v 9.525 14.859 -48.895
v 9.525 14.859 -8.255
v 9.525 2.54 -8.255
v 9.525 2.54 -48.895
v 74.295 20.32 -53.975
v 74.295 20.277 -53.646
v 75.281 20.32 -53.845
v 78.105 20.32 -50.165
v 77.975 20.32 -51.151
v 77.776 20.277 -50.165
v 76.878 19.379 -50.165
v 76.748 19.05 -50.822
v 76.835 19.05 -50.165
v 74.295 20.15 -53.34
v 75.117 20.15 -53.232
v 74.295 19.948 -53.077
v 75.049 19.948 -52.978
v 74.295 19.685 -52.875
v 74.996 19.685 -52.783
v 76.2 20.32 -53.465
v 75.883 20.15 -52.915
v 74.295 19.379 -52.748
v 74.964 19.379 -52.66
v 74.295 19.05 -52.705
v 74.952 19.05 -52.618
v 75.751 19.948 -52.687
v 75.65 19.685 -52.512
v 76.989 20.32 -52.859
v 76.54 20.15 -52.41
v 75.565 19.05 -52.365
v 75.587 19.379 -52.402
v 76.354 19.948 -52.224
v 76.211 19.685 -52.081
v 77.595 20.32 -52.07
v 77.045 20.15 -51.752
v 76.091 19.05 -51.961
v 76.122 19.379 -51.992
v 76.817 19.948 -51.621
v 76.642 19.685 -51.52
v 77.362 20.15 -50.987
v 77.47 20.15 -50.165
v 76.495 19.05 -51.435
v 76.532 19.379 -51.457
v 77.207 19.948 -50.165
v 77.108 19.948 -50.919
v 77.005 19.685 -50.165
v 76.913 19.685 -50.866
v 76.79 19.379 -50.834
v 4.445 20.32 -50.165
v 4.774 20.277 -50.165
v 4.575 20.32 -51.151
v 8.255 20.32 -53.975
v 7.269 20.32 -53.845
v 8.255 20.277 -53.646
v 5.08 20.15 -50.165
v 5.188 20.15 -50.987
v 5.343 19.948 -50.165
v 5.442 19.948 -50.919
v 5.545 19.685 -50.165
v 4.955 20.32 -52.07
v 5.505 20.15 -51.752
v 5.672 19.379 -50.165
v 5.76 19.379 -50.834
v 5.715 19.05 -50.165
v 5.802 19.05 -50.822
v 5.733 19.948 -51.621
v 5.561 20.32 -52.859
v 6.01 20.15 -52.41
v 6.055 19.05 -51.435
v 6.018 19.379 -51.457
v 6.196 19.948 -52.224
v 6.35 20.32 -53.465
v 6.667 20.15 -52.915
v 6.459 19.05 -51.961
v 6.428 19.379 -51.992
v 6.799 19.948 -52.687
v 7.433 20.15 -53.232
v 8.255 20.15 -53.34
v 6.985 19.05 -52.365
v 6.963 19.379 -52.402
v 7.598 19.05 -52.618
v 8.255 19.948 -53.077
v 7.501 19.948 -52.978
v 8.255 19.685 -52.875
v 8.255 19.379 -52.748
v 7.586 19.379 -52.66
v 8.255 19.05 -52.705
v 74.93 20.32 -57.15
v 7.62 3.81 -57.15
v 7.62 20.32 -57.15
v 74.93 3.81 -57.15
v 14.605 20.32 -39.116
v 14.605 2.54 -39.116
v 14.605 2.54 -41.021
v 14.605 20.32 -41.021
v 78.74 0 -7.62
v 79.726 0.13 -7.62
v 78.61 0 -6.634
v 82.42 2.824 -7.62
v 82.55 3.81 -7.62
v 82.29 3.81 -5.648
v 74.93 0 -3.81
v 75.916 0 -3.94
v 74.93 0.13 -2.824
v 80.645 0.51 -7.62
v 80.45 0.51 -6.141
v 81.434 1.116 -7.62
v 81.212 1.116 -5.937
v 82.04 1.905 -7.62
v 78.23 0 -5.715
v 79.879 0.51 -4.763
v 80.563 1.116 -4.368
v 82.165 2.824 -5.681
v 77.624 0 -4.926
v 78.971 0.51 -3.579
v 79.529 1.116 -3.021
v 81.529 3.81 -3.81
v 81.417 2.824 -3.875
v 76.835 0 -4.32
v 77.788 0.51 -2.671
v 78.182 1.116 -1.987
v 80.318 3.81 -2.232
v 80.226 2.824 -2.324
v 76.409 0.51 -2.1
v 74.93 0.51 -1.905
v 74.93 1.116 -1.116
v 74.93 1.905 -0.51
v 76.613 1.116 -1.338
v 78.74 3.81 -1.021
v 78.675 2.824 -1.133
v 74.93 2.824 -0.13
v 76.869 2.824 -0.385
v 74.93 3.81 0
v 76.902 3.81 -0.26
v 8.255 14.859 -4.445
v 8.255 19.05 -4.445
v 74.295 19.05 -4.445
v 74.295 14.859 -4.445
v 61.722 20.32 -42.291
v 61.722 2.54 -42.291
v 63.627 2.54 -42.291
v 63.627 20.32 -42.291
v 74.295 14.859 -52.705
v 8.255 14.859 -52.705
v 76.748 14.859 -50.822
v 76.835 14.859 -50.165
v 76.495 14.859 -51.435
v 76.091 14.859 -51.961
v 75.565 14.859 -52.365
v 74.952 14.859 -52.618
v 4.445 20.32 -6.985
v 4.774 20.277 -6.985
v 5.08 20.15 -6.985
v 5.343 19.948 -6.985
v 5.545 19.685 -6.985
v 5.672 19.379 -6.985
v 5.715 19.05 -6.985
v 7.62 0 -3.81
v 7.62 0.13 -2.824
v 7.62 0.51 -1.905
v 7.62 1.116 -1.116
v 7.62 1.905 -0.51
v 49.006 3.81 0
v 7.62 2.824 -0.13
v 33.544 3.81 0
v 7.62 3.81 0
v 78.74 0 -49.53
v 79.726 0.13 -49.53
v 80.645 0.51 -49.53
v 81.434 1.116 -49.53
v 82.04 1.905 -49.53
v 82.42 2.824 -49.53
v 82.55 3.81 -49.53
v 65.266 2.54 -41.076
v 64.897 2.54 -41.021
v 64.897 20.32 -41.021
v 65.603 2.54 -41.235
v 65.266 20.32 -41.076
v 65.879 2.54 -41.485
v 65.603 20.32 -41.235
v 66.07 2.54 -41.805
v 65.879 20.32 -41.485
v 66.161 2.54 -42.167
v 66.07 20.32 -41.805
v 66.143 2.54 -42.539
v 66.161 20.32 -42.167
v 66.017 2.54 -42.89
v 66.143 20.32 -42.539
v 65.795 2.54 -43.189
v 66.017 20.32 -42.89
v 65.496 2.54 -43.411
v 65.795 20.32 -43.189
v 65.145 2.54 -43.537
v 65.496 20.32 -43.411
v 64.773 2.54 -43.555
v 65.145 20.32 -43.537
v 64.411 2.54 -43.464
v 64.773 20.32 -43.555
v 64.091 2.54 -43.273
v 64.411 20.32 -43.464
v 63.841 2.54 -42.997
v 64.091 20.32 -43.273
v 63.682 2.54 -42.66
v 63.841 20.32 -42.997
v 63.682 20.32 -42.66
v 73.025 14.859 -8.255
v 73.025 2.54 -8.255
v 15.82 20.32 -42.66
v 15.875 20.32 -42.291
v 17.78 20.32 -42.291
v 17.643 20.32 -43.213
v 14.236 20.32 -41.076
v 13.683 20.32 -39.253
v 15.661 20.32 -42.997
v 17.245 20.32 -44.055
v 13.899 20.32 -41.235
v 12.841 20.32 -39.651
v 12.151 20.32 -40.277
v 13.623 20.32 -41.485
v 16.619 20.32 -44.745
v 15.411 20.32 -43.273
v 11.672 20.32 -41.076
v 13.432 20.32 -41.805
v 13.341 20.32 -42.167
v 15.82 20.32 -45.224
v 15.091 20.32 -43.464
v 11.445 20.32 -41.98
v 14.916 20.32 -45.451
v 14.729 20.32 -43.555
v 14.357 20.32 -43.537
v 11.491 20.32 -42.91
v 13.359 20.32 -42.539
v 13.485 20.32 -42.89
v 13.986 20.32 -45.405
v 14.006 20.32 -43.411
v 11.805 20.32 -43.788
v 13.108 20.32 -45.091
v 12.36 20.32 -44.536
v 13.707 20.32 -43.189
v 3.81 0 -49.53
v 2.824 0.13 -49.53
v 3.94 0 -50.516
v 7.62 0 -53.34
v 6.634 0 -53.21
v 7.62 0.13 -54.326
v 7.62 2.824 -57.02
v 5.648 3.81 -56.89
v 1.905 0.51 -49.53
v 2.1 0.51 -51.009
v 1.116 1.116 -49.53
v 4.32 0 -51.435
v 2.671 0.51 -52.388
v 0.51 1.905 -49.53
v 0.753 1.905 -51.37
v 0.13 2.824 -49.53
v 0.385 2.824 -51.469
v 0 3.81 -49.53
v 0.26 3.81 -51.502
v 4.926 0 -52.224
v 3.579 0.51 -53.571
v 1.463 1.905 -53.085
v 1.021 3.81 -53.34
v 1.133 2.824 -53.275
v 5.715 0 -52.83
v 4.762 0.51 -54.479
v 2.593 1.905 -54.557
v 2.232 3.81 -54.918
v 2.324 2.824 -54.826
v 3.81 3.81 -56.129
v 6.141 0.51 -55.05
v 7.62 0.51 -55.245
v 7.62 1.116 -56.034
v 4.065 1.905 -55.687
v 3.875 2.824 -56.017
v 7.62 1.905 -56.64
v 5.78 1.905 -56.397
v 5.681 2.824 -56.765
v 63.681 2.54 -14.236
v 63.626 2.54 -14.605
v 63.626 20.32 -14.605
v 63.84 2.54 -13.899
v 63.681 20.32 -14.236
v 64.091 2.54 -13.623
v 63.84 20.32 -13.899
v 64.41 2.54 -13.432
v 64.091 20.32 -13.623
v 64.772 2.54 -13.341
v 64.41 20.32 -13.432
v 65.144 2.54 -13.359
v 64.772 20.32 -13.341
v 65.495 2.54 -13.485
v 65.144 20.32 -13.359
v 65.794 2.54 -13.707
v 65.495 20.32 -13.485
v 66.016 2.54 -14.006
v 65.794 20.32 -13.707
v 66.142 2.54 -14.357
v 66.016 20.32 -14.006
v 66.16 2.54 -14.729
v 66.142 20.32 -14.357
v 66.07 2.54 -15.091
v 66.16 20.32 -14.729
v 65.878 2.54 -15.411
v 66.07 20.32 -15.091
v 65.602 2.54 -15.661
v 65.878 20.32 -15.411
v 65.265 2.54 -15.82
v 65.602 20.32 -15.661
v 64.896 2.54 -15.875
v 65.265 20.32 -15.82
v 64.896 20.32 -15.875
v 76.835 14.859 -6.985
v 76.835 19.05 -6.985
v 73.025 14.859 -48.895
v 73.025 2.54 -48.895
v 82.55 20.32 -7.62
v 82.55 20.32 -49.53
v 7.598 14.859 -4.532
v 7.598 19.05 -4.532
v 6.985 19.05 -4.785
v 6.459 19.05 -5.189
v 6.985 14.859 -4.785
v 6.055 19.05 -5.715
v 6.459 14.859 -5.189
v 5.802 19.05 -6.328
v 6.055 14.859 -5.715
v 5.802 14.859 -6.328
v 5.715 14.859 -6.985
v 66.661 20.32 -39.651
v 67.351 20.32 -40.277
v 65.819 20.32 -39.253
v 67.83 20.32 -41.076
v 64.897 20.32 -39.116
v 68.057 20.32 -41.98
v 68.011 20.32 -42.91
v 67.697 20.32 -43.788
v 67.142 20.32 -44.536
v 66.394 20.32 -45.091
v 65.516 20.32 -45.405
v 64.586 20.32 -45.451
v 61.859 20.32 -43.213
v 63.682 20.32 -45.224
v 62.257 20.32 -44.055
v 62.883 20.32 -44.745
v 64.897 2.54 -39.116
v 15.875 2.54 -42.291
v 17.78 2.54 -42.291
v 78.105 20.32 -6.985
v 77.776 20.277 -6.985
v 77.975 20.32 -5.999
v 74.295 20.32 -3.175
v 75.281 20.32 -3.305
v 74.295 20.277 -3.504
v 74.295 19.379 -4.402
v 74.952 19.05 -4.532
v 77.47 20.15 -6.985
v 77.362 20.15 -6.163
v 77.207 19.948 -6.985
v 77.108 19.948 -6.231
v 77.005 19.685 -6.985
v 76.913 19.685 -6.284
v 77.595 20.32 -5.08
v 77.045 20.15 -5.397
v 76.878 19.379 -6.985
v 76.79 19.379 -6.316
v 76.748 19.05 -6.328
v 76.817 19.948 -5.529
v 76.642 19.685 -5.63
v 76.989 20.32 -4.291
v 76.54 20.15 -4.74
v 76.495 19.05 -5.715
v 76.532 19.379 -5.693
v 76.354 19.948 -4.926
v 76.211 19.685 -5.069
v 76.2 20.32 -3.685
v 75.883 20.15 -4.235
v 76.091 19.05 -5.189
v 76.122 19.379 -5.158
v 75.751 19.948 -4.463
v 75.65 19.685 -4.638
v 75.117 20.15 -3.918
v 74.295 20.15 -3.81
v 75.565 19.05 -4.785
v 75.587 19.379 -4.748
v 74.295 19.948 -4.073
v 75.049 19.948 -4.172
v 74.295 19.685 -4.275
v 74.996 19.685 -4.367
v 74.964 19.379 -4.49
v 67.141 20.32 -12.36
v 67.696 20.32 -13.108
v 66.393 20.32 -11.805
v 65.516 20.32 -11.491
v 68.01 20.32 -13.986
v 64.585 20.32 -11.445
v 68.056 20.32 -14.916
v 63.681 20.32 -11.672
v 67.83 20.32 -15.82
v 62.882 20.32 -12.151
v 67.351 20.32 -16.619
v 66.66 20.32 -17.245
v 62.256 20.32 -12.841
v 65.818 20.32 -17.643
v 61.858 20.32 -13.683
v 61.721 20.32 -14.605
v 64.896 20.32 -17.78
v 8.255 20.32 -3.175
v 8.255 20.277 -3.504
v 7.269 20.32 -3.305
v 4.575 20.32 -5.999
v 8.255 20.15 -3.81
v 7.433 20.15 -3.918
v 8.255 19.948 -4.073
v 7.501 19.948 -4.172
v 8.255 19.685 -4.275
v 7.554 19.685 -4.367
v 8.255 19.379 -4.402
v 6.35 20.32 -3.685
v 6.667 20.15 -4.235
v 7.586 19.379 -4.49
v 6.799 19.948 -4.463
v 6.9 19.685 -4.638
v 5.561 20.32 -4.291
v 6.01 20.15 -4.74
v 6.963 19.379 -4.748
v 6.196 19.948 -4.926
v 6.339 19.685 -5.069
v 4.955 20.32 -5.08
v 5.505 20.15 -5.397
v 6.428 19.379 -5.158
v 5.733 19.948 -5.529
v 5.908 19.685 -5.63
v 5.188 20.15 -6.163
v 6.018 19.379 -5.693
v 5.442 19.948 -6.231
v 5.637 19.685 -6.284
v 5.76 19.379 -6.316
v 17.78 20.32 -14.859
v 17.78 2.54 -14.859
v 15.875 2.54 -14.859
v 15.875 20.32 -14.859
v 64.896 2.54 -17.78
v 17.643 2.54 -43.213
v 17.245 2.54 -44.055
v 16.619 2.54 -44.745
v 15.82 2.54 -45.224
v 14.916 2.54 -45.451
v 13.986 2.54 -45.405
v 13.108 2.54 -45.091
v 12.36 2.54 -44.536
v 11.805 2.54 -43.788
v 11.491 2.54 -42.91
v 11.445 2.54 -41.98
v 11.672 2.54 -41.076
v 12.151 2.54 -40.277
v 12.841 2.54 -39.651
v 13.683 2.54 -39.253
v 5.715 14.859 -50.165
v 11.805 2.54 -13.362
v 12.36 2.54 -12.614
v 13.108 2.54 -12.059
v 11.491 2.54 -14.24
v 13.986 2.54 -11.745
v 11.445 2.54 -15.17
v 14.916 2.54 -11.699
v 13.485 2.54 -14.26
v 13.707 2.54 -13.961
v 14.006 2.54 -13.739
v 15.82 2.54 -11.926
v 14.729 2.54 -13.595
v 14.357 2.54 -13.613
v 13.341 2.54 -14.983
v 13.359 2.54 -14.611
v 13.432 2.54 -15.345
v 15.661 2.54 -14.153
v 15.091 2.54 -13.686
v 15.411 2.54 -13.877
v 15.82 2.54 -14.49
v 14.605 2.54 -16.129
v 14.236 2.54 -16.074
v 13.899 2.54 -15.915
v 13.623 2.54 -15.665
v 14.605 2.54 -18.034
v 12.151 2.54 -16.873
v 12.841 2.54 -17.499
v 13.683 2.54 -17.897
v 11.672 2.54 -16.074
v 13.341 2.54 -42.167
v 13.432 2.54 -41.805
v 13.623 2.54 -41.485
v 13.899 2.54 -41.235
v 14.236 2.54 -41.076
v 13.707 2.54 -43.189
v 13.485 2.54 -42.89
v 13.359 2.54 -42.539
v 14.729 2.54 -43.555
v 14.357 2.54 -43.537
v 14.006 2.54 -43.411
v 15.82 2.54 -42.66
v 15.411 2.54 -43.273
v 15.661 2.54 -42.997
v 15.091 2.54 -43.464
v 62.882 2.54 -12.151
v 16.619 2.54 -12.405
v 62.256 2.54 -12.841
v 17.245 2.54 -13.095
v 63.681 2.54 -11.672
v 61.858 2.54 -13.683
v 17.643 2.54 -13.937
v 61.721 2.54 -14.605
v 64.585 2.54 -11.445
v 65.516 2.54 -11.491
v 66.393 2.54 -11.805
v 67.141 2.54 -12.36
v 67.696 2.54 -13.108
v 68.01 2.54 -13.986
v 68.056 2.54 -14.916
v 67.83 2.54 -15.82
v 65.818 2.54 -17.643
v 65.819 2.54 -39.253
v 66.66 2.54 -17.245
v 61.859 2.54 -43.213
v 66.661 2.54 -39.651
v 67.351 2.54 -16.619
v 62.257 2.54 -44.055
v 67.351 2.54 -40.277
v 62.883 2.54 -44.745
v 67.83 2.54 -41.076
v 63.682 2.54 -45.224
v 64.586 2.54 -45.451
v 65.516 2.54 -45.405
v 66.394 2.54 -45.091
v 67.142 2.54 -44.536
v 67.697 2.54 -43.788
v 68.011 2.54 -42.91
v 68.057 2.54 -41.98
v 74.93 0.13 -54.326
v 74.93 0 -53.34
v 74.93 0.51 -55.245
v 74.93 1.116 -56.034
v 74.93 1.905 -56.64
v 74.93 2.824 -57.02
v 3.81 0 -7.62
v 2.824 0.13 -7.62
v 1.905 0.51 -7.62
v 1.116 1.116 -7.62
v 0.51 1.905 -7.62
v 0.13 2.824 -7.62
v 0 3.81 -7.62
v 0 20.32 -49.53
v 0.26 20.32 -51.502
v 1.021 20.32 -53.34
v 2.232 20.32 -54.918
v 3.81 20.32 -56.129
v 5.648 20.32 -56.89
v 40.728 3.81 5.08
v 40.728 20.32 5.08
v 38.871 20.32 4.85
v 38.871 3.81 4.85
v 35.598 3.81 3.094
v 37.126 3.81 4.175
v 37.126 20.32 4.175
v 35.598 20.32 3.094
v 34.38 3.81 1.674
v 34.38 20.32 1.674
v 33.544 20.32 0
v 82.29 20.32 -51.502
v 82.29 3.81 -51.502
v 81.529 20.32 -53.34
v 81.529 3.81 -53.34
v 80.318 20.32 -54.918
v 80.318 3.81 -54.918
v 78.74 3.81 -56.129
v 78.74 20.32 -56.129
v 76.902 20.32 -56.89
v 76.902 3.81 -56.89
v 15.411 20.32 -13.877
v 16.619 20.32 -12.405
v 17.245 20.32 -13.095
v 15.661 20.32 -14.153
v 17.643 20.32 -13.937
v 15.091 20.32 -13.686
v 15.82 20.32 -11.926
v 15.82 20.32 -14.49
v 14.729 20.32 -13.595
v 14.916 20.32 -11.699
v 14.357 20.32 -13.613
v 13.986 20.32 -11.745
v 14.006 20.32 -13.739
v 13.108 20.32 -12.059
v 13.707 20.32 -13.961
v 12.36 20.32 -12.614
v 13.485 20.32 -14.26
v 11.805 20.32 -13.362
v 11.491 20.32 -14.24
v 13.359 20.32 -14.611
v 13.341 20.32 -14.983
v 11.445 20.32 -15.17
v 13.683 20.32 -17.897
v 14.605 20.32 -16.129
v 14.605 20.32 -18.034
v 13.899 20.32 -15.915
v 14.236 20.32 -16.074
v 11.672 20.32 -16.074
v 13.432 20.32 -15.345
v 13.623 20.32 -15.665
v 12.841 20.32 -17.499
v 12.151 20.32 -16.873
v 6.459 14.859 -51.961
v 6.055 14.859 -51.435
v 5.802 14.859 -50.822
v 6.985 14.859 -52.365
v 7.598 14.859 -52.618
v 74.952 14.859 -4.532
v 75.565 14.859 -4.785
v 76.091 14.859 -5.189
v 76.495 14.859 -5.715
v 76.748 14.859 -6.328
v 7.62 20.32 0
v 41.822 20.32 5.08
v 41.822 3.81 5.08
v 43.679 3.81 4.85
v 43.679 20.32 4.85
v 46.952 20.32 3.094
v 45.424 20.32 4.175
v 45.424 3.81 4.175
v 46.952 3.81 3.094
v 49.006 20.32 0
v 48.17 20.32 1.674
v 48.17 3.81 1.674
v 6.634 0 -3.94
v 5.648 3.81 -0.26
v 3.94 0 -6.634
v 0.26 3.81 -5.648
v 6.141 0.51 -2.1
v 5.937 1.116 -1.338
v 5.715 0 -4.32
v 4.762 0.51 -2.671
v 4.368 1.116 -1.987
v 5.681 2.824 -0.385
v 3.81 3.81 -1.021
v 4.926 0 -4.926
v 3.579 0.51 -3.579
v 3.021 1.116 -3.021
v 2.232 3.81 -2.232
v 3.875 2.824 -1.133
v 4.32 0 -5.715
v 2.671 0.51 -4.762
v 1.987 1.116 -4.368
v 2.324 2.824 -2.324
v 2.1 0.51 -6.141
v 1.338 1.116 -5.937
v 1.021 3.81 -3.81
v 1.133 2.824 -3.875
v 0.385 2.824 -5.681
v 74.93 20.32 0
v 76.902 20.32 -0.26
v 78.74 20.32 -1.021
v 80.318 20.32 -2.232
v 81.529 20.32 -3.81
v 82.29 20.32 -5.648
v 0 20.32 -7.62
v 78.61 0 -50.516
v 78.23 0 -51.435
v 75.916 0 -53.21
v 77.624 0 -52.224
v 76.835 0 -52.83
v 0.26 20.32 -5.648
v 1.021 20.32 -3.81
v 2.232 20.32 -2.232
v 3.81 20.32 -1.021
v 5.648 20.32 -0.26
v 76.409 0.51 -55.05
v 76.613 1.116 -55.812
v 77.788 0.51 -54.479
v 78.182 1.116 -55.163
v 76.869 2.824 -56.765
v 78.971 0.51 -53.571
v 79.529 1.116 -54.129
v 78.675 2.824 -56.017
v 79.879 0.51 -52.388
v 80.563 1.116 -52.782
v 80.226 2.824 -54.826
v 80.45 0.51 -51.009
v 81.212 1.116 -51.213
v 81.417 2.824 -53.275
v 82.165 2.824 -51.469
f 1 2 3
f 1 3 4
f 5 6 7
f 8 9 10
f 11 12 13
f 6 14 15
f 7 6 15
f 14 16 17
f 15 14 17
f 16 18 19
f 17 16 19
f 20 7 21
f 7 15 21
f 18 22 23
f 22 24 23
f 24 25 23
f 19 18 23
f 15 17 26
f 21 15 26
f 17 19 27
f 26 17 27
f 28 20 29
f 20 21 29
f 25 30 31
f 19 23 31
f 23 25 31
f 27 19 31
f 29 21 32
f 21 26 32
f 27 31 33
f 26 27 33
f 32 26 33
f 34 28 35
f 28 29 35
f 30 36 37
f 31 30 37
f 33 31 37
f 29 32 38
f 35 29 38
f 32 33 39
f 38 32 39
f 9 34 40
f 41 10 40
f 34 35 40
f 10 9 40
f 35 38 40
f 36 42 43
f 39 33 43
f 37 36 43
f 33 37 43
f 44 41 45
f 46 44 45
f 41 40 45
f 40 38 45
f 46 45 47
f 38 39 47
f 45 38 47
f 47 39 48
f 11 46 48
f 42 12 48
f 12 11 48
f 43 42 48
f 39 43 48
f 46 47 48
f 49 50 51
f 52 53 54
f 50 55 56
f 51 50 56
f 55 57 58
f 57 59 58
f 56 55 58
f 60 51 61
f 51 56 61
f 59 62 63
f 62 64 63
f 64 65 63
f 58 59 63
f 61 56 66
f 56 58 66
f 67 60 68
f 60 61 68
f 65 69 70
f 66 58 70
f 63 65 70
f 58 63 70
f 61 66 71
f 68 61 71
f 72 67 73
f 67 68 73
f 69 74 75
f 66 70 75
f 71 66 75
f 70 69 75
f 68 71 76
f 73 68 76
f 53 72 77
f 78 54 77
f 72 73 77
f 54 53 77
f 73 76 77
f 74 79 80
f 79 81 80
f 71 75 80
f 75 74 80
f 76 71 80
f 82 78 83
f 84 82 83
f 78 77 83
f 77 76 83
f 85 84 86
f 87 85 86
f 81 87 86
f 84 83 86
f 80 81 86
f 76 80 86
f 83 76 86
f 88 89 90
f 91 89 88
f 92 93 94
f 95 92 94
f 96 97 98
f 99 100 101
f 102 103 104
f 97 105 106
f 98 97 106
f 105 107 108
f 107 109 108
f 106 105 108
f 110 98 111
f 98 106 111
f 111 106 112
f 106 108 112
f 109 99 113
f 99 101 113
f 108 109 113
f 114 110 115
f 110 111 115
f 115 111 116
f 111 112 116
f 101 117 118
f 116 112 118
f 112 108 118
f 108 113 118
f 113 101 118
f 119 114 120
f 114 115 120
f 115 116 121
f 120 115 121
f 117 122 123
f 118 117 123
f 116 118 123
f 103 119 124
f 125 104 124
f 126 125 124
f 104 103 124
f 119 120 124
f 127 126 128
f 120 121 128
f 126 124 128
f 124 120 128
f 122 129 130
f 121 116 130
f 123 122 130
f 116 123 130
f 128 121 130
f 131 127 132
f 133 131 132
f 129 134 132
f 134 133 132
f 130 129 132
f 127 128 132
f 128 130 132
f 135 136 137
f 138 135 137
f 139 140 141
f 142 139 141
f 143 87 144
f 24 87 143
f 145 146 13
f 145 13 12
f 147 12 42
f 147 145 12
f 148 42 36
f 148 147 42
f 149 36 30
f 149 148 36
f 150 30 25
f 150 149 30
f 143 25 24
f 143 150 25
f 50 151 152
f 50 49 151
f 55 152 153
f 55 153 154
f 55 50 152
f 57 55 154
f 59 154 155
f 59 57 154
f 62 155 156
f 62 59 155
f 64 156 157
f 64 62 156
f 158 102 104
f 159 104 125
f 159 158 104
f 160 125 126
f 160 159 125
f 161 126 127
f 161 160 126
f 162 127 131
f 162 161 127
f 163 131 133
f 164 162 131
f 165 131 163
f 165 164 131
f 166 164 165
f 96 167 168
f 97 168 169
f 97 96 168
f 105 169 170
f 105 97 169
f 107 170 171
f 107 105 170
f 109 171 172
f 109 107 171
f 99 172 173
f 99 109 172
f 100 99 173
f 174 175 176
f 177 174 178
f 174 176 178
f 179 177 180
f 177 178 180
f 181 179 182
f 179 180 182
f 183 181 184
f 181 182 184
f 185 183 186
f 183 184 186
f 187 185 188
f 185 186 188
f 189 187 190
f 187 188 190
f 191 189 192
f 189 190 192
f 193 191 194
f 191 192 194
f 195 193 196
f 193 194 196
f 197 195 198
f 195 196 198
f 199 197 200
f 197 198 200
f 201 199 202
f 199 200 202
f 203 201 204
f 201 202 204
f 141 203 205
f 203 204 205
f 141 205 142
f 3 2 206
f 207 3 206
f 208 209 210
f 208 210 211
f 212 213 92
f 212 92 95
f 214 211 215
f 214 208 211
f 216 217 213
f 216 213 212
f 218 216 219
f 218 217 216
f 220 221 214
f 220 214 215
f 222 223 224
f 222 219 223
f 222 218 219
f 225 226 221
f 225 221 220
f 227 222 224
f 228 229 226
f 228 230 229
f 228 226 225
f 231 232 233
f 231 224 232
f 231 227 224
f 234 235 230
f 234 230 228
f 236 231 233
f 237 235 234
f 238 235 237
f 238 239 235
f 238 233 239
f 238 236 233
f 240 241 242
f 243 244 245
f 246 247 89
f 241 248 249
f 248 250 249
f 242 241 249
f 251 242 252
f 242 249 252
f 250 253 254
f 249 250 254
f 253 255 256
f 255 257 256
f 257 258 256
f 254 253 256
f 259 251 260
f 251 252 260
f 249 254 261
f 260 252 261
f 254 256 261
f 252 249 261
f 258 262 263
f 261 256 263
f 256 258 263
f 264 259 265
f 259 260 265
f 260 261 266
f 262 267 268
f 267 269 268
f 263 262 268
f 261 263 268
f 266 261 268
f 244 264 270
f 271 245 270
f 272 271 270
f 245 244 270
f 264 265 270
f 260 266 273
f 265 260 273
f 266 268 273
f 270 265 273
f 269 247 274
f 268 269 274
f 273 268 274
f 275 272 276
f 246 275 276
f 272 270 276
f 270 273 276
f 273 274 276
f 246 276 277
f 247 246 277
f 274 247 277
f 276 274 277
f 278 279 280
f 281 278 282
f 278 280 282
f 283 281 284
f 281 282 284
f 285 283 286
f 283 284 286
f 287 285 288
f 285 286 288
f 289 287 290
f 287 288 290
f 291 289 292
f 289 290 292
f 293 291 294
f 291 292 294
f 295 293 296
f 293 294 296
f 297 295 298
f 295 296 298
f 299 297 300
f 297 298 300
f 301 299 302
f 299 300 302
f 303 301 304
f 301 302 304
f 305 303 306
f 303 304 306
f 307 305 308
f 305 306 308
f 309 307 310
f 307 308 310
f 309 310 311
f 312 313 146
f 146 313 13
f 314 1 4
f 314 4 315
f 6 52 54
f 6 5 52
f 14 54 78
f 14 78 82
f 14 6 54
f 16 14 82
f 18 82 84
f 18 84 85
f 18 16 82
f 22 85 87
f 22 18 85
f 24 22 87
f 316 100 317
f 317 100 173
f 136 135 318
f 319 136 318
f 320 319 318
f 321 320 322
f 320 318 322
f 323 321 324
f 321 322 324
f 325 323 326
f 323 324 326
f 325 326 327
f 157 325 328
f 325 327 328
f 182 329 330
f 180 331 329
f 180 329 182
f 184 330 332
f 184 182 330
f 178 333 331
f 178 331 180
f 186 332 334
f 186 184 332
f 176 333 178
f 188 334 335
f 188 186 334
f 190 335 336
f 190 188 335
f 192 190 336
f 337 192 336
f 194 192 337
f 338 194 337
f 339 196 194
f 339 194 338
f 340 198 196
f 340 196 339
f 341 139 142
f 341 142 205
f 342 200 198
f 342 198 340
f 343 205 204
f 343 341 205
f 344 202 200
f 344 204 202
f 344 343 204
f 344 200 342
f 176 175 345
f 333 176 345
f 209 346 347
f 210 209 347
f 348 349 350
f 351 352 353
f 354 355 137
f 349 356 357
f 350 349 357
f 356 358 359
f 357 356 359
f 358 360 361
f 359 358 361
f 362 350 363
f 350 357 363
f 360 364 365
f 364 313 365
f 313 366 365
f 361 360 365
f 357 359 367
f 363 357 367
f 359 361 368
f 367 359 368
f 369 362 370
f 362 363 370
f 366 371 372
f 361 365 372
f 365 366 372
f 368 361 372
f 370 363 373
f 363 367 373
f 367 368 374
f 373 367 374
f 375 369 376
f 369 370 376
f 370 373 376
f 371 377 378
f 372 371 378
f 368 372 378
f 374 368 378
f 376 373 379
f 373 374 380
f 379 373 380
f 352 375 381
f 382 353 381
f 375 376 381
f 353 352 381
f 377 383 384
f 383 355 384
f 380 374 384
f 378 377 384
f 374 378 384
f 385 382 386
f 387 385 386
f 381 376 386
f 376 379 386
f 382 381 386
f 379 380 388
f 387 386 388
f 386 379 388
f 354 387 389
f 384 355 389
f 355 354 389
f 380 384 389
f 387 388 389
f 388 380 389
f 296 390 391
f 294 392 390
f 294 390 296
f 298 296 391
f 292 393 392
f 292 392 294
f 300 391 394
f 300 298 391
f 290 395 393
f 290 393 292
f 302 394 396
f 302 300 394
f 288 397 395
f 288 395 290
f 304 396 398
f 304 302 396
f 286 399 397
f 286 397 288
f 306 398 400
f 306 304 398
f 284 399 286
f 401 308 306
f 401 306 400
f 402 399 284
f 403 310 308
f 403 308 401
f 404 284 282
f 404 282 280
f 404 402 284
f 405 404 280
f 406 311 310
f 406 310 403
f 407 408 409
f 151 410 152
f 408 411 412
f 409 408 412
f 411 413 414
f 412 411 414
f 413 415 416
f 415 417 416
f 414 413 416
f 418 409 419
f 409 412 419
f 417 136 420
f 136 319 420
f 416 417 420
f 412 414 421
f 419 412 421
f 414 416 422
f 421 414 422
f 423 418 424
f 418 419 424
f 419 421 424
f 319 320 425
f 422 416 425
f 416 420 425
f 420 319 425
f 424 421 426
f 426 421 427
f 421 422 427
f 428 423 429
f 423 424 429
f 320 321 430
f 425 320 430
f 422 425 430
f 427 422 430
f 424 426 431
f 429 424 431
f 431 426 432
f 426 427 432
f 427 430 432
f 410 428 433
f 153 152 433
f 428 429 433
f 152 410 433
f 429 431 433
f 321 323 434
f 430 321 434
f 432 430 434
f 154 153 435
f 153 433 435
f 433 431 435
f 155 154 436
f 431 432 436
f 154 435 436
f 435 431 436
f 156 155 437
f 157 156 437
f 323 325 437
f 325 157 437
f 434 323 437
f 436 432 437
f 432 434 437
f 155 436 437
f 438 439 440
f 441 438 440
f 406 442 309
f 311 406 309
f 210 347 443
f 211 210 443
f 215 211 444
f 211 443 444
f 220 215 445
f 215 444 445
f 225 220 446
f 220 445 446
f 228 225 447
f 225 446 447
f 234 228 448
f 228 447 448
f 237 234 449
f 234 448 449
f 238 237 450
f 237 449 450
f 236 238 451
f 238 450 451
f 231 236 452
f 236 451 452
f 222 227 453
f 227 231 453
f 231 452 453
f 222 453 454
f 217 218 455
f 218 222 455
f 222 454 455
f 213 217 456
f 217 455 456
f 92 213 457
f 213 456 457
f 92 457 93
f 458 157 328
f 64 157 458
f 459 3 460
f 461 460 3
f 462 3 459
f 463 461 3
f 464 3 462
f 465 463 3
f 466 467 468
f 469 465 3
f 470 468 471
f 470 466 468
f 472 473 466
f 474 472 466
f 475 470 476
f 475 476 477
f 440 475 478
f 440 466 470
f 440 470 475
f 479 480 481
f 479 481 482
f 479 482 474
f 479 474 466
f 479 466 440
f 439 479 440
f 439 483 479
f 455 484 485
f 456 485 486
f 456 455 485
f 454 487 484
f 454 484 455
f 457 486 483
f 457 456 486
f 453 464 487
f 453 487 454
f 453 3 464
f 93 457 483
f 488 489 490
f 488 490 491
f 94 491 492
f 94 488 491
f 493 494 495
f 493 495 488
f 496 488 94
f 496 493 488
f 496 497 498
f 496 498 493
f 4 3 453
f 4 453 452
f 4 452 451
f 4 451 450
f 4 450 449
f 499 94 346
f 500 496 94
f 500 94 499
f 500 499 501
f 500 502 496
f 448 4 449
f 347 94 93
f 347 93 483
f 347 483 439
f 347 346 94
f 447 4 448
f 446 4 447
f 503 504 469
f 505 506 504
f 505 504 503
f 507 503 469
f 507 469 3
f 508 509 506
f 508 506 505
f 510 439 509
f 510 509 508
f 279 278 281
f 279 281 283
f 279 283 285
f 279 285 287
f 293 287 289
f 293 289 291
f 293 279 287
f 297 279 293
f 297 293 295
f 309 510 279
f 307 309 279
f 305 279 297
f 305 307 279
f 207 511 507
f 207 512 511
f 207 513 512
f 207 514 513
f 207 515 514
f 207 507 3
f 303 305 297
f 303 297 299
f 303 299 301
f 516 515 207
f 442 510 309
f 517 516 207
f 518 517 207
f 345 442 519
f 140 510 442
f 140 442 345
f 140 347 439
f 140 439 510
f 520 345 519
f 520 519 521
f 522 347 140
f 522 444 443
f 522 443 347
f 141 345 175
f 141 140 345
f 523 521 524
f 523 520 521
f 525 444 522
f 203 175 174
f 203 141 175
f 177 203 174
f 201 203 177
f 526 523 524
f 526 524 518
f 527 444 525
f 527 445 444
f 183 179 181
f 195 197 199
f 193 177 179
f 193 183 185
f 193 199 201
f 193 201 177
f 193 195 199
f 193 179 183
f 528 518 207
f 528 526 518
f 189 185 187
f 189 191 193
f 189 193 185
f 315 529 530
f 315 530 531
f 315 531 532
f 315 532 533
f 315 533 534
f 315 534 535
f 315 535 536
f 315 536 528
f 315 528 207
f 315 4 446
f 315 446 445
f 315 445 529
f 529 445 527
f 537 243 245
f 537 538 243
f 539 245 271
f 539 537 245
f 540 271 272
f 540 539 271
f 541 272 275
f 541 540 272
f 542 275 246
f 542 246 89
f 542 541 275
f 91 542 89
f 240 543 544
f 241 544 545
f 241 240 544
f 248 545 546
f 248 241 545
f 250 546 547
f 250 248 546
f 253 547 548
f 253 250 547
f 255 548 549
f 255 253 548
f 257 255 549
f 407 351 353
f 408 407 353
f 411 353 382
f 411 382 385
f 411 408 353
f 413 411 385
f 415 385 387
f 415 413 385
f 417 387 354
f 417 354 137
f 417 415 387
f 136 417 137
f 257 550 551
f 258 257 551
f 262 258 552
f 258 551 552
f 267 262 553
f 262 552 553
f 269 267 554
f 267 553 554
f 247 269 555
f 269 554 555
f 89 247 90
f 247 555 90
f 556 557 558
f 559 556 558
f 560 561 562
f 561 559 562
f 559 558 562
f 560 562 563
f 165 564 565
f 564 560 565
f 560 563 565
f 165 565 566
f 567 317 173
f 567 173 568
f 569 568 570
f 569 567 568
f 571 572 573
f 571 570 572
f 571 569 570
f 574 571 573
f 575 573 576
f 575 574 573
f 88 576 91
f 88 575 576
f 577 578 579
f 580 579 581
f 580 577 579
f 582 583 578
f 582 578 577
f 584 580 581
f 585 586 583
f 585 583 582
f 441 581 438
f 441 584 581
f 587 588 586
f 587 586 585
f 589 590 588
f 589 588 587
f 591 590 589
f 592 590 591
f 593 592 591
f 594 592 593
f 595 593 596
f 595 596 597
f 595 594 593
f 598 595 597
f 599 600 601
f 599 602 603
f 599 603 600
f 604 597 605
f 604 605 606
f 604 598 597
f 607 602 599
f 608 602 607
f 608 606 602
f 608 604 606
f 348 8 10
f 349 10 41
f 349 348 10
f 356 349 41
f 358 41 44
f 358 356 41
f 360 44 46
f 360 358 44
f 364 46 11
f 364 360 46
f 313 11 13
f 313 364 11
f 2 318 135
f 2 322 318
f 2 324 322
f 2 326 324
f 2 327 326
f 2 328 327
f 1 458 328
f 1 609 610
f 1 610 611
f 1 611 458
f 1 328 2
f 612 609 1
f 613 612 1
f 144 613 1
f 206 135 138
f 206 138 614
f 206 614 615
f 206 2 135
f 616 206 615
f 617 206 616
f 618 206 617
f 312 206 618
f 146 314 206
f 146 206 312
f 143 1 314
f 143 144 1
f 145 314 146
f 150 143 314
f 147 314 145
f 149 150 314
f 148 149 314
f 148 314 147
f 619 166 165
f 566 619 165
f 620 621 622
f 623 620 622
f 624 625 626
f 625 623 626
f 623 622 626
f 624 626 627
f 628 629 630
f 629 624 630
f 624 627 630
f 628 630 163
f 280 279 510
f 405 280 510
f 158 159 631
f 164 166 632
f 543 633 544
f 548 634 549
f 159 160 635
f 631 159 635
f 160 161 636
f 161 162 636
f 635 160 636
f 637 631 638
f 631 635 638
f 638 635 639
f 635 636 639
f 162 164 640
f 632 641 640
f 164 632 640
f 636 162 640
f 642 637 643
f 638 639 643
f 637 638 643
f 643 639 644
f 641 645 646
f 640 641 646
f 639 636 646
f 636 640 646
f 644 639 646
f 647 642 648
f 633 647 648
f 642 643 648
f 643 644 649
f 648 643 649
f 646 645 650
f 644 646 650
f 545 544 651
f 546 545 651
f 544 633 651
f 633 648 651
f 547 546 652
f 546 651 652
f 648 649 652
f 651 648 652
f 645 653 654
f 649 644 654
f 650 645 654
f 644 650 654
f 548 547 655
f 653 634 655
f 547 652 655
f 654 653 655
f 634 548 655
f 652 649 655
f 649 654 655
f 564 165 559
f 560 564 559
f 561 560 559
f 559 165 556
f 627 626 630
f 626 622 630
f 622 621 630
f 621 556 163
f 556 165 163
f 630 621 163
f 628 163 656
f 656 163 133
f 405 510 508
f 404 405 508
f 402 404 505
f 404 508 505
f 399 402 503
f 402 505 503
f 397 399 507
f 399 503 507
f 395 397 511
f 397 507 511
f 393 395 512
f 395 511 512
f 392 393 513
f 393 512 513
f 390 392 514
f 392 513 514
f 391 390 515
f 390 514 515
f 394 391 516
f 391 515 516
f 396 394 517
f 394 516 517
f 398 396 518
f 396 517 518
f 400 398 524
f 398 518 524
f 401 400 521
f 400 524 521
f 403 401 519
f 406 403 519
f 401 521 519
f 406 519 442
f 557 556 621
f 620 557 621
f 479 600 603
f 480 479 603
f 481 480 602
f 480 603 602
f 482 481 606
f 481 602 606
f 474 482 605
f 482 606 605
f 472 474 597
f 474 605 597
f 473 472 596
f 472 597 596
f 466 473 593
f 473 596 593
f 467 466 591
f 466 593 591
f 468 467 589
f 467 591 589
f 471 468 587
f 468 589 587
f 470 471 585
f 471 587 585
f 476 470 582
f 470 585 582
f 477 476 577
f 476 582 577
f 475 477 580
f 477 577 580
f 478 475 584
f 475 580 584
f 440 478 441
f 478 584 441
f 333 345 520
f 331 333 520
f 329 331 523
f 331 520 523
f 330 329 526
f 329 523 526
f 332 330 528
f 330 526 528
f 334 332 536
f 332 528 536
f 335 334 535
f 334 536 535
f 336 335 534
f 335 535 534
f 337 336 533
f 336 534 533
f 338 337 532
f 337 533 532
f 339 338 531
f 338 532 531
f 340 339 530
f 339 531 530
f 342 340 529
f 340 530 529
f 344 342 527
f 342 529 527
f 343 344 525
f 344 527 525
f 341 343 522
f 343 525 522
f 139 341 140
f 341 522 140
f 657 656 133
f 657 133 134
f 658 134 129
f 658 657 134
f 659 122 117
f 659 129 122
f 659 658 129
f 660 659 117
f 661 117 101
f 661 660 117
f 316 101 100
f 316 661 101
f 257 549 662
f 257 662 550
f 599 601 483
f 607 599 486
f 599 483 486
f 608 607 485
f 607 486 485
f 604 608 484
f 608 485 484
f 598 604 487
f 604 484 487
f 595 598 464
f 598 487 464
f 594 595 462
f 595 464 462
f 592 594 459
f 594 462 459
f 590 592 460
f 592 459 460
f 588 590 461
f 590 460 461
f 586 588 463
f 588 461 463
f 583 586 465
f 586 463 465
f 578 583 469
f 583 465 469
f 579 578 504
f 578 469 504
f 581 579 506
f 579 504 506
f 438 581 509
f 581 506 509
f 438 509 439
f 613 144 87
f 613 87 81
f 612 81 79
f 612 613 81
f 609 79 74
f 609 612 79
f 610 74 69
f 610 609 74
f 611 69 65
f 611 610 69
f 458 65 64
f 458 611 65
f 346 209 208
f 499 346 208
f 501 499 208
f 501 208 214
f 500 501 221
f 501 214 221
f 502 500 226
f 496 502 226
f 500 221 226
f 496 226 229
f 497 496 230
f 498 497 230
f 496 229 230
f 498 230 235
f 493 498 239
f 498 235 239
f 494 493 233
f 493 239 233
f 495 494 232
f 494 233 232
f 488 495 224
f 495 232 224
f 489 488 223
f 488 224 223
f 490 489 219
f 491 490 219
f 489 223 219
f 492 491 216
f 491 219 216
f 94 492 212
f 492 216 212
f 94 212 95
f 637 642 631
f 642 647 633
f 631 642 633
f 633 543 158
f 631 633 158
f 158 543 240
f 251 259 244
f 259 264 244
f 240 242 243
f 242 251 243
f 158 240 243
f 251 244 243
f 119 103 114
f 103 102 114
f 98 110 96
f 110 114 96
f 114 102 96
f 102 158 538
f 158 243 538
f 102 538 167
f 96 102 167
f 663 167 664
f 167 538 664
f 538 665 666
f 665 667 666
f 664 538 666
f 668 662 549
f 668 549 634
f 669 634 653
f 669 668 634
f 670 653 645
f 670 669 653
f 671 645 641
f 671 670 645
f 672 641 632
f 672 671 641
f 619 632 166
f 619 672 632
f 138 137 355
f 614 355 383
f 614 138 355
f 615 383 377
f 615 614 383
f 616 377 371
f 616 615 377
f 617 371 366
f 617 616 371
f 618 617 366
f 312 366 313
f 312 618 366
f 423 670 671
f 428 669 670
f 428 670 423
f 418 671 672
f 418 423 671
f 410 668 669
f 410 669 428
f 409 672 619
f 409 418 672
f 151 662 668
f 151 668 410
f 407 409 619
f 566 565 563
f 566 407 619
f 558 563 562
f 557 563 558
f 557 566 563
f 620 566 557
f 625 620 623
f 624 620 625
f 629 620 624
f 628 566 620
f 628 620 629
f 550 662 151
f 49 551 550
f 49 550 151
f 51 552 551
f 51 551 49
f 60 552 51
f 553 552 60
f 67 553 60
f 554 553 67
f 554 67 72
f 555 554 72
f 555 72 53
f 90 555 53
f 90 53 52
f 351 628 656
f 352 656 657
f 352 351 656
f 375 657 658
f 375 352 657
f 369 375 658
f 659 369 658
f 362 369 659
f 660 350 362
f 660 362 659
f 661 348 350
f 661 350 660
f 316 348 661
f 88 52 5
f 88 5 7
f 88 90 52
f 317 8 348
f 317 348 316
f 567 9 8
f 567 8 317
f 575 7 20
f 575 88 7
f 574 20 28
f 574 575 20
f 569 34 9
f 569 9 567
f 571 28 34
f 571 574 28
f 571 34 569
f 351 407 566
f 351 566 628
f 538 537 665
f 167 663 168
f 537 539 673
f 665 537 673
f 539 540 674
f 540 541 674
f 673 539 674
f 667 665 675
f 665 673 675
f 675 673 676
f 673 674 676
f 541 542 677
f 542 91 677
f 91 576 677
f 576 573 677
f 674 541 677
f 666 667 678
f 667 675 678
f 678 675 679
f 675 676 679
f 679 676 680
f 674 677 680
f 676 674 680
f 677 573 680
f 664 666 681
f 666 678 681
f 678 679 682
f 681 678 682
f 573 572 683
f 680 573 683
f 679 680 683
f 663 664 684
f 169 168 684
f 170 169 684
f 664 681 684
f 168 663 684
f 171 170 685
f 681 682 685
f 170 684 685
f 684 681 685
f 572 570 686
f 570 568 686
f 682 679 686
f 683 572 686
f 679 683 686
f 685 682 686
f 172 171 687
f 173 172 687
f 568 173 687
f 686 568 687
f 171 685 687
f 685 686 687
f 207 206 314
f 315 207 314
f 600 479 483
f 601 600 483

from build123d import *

# Parameters (mm, degrees)
SKETCH1_W               = 82.55
SKETCH1_H               = 57.15
BOSS_EXTRUDE1_DEPTH     = 20.32
FILLET2_R               = 7.62
FILLET3_R               = 3.81
SKETCH2_W               = 63.5
SKETCH2_H               = 40.64
CUT_EXTRUDE1_DEPTH      = 17.78
SKETCH9_W               = 15.46152766
SKETCH9_H               = 16.51
BOSS_EXTRUDE5_DEPTH     = 5.08
FILLET10_R              = 7.62
SKETCH7_W               = 71.12
SKETCH7_H               = 48.26
CUT_EXTRUDE4_DEPTH      = 5.461
FILLET12_R              = 2.54
FILLET13_R              = 1.27
SKETCH5_R               = 3.175
BOSS_EXTRUDE6_DEPTH     = 17.78
SKETCH11_R              = 1.27
CUT_EXTRUDE5_DEPTH      = 17.78
CUT_EXTRUDE_THIN1_DEPTH = 102.964471319


with BuildPart() as part:
    # Sketch1 → Boss-Extrude1 (new body)
    with BuildSketch(Plane(origin=(0, 0, 0), x_dir=(1, 0, 0), z_dir=(0, 1, 0))):
        with Locations((41.275, 28.575)):
            Rectangle(SKETCH1_W, SKETCH1_H)
    extrude(amount=BOSS_EXTRUDE1_DEPTH)

    # Fillet2
    fillet2_edges = [part.edges().sort_by_distance(p)[0] for p in [
        (0, 10.16, -57.15),
        (82.55, 10.16, -57.15),
        (82.55, 10.16, 0),
        (0, 10.16, 0),
    ]]
    fillet(fillet2_edges, radius=FILLET2_R)

    # Fillet3
    fillet3_edges = [part.edges().sort_by_distance(p)[0] for p in [
        (41.275, 0, -57.15),
        (0, 0, -28.575),
        (82.55, 0, -28.575),
        (41.275, 0, 0),
        (2.231846327, 0, -54.918153673),
        (2.231846327, 0, -2.231846327),
        (80.318153673, 0, -2.231846327),
        (80.318153673, 0, -54.918153673),
    ]]
    fillet(fillet3_edges, radius=FILLET3_R)

    # Sketch2 → Cut-Extrude1 (cut)
    with BuildSketch(Plane(origin=(0, 20.32, 0), x_dir=(1, 0, 0), z_dir=(0, 1, 0))):
        with Locations((41.275, 28.575)):
            Rectangle(SKETCH2_W, SKETCH2_H)
    extrude(amount=-CUT_EXTRUDE1_DEPTH, mode=Mode.SUBTRACT)

    # Sketch9 → Boss-Extrude5 (add)
    with BuildSketch(Plane.XY):
        with Locations((41.275, 12.065)):
            Rectangle(SKETCH9_W, SKETCH9_H)
    extrude(amount=BOSS_EXTRUDE5_DEPTH)

    # Fillet10
    # the kernel refuses this fillet: 7.62 mm, written as the material it takes off along each edge
    with BuildSketch(Plane(origin=(49.00576383, -14.150512242, 5.08), x_dir=(-1, 0, 0), z_dir=(0, 1, 0))) as fillet10_piece_1:
        with BuildLine():
            CenterArc((7.184204897, -7.62), FILLET10_R, 90, 70.528779366)
            Line((0, -5.08), (-0.143684098, -5.0292))
            ThreePointArc((-0.143684098, -5.0292), (-0.1524, -2.54), (-0.1524, 0))
            Line((-0.1524, 0), (0, 0.1524))
            Line((0, 0.1524), (7.184204897, 0.1524))
            Line((7.184204897, 0.1524), (7.184204897, 0))
        make_face()
    extrude(amount=52.431024484, mode=Mode.SUBTRACT)
    with BuildSketch(Plane(origin=(33.54423617, 38.280512242, 5.08), x_dir=(0, 0, -1), z_dir=(0, -1, 0))) as fillet10_piece_2:
        with BuildLine():
            CenterArc((7.62, 7.184204897), FILLET10_R, 180, 70.528779366)
            Line((0, 7.184204897), (-0.1524, 7.184204897))
            Line((-0.1524, 7.184204897), (-0.1524, 0))
            Line((-0.1524, 0), (0, -0.1524))
            ThreePointArc((0, -0.1524), (2.54, -0.1524), (5.0292, -0.143684098))
            Line((5.0292, -0.143684098), (5.08, 0))
        make_face()
    extrude(amount=52.431024484, mode=Mode.SUBTRACT)

    # Sketch7 → Cut-Extrude4 (cut)
    with BuildSketch(Plane(origin=(0, 20.32, 0), x_dir=(1, 0, 0), z_dir=(0, 1, 0))):
        with Locations((41.275, 28.575)):
            Rectangle(SKETCH7_W, SKETCH7_H)
    extrude(amount=-CUT_EXTRUDE4_DEPTH, mode=Mode.SUBTRACT)

    # Fillet12
    fillet12_edges = [part.edges().sort_by_distance(p)[0] for p in [
        (5.715, 17.5895, -52.705),
        (76.835, 17.5895, -52.705),
        (76.835, 17.5895, -4.445),
        (5.715, 17.5895, -4.445),
    ]]
    fillet(fillet12_edges, radius=FILLET12_R)

    # Fillet13
    fillet13_edges = [part.edges().sort_by_distance(p)[0] for p in [
        (41.275, 20.32, -52.705),
        (76.835, 20.32, -28.575),
        (41.275, 20.32, -4.445),
        (5.715, 20.32, -28.575),
        (76.091051224, 20.32, -51.961051224),
        (76.091051224, 20.32, -5.188948776),
        (6.458948776, 20.32, -51.961051224),
        (6.458948776, 20.32, -5.188948776),
    ]]
    fillet(fillet13_edges, radius=FILLET13_R)

    # Sketch5 → Boss-Extrude6 (add)
    with BuildSketch(Plane(origin=(0, 2.54, 0), x_dir=(1, 0, 0), z_dir=(0, 1, 0))):
        with Locations(Location((14.605, 42.291, 0), (0, 0, 90))):
            Circle(SKETCH5_R)
        with Locations(Location((14.605, 14.859, 0), (0, 0, 90))):
            Circle(SKETCH5_R)
        with Locations(Location((64.897, 42.291, 0), (0, 0, 90))):
            Circle(SKETCH5_R)
        with Locations(Location((64.896358582, 14.605, 0), (0, 0, 90))):
            Circle(SKETCH5_R)
    extrude(amount=BOSS_EXTRUDE6_DEPTH)

    # Sketch11 → Cut-Extrude5 (cut)
    with BuildSketch(Plane(origin=(0, 20.32, 0), x_dir=(1, 0, 0), z_dir=(0, 1, 0))):
        with Locations(Location((14.605, 14.859, 0), (0, 0, 270))):
            Circle(SKETCH11_R)
        with Locations(Location((14.605, 42.291, 0), (0, 0, 270))):
            Circle(SKETCH11_R)
        with Locations(Location((64.896358582, 14.605, 0), (0, 0, 270))):
            Circle(SKETCH11_R)
        with Locations(Location((64.897, 42.291, 0), (0, 0, 270))):
            Circle(SKETCH11_R)
    extrude(amount=-CUT_EXTRUDE5_DEPTH, mode=Mode.SUBTRACT)

    # Sketch17 → Cut-Extrude-Thin1 (cut, through all)
    with BuildSketch(Plane(origin=(0, 2.54, 0), x_dir=(1, 0, 0), z_dir=(0, 1, 0))):
        with BuildLine():
            ThreePointArc((18.78, 42.291), (17.557170811, 39.338829189), (14.605, 38.116))
            Line((14.605, 38.116), (14.605, 41.656))
            ThreePointArc((14.605, 41.656), (15.054012806, 41.841987194), (15.24, 42.291))
            Line((15.24, 42.291), (18.78, 42.291))
        make_face()
        with BuildLine():
            ThreePointArc((60.721358582, 14.605), (61.94418777, 17.557170811), (64.896358582, 18.78))
            Line((64.896358582, 18.78), (64.896358582, 15.24))
            ThreePointArc((64.896358582, 15.24), (64.447345776, 15.054012806), (64.261358582, 14.605))
            Line((64.261358582, 14.605), (60.721358582, 14.605))
        make_face()
        with BuildLine():
            ThreePointArc((14.605, 19.034), (17.557170811, 17.811170811), (18.78, 14.859))
            Line((18.78, 14.859), (15.24, 14.859))
            ThreePointArc((15.24, 14.859), (15.054012806, 15.308012806), (14.605, 15.494))
            Line((14.605, 15.494), (14.605, 19.034))
        make_face()
        with BuildLine():
            ThreePointArc((64.627, 42.291), (64.706081169, 42.100081169), (64.897, 42.021))
            Line((64.897, 42.021), (64.897, 38.481))
            ThreePointArc((64.897, 38.481), (62.202923164, 39.596923164), (61.087, 42.291))
            Line((61.087, 42.291), (64.627, 42.291))
        make_face()
    extrude(amount=CUT_EXTRUDE_THIN1_DEPTH, mode=Mode.SUBTRACT)


solid = part.part
